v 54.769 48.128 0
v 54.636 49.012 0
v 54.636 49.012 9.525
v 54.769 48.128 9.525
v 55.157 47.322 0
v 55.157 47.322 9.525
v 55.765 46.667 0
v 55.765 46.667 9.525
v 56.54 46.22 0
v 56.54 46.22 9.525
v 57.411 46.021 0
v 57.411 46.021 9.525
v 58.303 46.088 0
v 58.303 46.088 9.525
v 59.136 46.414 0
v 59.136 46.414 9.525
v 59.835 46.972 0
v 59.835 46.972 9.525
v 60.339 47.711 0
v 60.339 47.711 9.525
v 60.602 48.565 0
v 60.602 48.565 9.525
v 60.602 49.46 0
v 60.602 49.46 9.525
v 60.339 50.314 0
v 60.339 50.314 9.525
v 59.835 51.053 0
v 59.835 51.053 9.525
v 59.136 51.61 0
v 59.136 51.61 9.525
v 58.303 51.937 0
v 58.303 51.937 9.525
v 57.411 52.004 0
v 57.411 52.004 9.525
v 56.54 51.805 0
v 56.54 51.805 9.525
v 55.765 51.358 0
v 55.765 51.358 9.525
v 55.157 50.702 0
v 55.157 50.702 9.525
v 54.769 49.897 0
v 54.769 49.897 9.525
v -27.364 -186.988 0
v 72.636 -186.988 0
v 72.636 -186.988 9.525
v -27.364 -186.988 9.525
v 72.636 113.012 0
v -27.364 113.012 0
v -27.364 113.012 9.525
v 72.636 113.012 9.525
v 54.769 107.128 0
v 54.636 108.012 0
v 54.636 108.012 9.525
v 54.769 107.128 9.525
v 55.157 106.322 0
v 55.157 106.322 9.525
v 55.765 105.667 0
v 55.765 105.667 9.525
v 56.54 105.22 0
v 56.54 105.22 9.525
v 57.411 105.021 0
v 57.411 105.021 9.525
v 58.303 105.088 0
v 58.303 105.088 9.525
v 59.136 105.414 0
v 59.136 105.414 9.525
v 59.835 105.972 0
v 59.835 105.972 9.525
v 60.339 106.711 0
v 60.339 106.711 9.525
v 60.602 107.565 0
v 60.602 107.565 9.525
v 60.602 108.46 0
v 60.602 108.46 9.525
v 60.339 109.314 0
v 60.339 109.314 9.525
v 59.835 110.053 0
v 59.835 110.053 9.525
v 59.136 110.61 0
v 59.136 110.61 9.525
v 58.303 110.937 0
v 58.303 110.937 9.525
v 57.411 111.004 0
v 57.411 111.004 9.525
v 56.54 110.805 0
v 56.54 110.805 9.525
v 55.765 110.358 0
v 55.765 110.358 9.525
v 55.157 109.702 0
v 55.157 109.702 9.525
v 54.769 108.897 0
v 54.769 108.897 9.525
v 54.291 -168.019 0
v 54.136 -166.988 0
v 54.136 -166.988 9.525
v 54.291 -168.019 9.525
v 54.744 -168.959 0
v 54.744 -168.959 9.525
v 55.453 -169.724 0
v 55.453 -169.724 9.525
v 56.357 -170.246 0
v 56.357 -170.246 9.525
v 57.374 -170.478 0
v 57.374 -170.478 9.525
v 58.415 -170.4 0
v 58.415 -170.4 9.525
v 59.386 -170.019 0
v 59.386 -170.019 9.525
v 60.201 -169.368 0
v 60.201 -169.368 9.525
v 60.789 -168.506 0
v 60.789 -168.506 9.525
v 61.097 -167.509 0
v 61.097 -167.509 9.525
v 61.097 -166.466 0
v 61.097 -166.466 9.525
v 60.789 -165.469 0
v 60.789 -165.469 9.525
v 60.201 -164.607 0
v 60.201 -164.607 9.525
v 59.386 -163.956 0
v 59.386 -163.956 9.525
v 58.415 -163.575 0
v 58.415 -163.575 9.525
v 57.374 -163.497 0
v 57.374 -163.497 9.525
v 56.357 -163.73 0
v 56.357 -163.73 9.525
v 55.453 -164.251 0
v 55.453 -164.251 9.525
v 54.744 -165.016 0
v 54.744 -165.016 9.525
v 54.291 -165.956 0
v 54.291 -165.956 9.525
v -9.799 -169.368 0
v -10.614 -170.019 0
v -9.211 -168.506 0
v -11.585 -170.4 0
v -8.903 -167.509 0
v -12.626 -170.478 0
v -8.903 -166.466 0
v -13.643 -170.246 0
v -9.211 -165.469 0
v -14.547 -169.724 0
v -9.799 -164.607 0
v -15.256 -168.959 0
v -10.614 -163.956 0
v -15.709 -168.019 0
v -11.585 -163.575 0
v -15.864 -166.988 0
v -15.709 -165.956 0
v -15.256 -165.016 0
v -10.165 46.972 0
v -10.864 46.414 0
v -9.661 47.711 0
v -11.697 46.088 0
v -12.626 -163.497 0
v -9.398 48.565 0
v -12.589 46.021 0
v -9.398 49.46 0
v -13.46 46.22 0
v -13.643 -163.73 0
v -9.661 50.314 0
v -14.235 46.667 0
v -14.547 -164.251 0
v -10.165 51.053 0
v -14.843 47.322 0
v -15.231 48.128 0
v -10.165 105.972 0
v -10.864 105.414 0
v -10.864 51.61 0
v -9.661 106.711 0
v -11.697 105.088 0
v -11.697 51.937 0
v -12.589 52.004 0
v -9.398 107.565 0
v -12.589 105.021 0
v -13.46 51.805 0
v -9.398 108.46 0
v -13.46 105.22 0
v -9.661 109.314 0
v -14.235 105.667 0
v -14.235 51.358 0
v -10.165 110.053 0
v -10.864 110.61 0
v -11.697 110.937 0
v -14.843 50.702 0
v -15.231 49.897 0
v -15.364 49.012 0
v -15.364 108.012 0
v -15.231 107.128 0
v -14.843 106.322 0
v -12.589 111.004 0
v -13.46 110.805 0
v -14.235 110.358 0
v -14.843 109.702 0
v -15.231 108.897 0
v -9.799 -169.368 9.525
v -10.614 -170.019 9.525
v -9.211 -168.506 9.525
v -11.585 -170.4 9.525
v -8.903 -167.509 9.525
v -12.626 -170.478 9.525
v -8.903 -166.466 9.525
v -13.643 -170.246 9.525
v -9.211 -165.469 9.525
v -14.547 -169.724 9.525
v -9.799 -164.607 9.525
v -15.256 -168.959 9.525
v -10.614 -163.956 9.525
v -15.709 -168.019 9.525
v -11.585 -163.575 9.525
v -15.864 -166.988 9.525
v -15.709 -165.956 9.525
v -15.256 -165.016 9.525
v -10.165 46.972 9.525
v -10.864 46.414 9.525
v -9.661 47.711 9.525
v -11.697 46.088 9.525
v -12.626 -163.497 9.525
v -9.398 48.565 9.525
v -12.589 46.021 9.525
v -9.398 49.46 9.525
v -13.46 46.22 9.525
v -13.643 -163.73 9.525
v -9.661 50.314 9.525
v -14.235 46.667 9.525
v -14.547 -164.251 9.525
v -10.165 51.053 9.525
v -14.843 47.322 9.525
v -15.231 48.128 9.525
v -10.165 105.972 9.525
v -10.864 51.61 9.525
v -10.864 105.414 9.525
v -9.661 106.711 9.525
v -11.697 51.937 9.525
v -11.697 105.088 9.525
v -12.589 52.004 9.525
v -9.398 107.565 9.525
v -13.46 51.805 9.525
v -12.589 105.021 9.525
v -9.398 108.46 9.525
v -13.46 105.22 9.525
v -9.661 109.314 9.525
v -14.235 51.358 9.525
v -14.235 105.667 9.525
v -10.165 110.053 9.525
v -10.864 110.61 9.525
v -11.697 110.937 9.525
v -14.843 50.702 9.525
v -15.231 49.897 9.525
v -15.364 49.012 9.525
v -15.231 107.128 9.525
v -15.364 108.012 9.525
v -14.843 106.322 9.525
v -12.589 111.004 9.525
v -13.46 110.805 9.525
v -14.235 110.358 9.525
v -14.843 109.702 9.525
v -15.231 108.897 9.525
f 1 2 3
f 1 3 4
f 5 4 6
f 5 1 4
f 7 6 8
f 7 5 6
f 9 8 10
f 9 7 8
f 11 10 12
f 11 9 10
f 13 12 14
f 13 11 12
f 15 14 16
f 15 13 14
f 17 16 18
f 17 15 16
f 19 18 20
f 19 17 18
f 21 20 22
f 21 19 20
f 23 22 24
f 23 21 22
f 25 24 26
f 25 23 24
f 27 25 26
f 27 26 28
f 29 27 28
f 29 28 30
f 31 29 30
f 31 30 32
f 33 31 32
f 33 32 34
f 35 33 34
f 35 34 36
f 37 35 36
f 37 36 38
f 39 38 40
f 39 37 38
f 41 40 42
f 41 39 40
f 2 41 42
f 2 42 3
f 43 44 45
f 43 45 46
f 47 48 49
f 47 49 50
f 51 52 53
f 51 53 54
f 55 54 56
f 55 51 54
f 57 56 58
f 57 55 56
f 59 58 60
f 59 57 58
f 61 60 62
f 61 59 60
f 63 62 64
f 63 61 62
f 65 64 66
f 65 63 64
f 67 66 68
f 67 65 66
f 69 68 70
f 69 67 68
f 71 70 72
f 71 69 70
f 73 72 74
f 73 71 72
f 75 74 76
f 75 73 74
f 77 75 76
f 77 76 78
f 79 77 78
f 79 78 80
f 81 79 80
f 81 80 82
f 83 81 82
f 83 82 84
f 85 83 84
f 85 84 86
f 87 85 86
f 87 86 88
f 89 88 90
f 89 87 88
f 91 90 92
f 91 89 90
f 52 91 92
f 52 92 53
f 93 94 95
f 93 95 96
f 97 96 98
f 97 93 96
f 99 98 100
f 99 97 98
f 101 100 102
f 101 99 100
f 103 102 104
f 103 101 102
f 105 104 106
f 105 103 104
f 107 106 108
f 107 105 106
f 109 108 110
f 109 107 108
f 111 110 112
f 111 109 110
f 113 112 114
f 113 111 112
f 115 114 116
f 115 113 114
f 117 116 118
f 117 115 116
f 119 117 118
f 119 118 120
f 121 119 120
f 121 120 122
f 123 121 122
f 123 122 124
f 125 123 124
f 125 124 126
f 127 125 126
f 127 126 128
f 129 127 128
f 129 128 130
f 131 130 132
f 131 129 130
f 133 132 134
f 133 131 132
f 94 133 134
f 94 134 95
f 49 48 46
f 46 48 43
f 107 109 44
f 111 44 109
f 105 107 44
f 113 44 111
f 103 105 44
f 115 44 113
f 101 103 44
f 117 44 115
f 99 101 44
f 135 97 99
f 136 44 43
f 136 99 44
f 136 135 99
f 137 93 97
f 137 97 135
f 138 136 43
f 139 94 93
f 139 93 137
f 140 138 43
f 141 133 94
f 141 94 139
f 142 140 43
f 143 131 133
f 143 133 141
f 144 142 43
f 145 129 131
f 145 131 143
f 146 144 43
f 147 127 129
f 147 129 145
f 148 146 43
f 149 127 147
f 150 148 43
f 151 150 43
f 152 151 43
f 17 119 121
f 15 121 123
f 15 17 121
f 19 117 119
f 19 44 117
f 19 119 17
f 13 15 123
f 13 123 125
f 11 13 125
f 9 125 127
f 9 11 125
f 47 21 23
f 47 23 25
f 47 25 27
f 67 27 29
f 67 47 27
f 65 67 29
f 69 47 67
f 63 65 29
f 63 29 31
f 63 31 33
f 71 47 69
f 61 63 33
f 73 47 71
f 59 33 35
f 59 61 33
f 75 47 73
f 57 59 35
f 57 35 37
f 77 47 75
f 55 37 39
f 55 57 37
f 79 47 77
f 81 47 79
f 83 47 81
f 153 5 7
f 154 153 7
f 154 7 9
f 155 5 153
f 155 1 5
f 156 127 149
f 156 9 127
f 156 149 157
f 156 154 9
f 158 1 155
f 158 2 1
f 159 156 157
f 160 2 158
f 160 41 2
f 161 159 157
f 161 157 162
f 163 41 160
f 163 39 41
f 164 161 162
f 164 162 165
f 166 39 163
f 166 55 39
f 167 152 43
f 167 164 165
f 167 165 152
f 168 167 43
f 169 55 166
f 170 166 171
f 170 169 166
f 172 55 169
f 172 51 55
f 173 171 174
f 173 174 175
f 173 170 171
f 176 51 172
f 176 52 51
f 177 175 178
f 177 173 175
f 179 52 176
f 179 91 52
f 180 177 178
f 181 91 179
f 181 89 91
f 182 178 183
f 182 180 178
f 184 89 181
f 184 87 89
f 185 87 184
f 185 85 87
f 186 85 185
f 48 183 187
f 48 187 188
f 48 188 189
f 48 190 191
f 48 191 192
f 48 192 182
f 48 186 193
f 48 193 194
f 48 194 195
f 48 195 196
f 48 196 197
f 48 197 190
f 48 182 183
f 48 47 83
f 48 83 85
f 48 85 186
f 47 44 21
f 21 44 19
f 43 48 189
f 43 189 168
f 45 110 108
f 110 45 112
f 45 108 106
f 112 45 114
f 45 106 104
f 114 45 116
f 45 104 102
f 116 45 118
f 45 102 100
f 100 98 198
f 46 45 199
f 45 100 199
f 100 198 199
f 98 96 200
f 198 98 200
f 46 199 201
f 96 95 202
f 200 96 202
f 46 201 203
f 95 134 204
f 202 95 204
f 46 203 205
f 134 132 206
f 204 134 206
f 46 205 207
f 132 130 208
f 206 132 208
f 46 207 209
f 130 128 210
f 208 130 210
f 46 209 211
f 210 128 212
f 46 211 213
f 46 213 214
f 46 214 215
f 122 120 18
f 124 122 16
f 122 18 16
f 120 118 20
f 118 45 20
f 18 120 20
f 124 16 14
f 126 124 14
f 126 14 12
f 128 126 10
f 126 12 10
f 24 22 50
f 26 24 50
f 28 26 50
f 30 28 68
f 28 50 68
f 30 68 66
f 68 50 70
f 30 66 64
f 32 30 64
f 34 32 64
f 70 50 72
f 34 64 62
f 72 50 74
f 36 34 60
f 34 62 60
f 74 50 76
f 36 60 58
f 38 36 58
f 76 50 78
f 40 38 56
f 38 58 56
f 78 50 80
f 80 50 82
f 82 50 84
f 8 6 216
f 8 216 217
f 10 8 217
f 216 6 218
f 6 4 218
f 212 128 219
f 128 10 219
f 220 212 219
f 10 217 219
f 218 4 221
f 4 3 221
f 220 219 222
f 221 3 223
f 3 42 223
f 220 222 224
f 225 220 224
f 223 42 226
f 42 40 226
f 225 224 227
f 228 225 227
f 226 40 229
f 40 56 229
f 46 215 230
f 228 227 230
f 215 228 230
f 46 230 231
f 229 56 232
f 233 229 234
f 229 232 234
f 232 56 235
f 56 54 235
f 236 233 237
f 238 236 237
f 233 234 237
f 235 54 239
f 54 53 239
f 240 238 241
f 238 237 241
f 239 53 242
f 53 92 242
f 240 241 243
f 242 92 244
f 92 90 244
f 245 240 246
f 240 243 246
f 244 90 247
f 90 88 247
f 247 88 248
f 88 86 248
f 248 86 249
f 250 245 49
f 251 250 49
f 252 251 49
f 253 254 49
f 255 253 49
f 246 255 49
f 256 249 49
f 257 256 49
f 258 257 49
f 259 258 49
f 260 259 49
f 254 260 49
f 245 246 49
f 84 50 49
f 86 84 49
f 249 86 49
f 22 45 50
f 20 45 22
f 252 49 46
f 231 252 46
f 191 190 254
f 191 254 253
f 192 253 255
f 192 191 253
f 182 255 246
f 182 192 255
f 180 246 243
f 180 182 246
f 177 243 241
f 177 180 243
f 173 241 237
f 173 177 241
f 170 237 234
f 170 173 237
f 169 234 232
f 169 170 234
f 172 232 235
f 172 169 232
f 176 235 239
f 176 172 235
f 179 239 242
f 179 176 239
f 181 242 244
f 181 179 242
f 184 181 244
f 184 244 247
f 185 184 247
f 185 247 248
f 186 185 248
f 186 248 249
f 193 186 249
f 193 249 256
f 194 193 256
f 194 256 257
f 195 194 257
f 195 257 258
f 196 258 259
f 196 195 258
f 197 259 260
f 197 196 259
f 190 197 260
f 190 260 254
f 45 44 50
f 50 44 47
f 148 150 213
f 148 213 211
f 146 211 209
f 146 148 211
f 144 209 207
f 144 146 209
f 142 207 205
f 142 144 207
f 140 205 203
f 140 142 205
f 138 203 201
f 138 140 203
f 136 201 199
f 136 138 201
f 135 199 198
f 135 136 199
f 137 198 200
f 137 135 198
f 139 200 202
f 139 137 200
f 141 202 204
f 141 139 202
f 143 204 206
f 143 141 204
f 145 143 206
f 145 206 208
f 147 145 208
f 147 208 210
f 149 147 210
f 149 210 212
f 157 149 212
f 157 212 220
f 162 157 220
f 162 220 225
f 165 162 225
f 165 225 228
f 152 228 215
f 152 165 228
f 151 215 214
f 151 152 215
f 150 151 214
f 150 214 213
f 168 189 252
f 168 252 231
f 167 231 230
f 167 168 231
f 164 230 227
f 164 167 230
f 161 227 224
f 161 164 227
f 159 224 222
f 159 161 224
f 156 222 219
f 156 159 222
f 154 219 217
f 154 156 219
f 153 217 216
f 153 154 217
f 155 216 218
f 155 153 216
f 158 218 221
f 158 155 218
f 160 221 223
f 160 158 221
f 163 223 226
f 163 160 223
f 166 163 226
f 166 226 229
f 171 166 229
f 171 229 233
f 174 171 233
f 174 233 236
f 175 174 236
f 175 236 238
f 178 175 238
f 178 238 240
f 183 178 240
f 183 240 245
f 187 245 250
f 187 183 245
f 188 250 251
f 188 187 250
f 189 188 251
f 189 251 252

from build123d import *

# Parameters (mm, degrees)
SKETCH1_R           = 3
SKETCH1_R_2         = 3.5
BOSS_EXTRUDE1_DEPTH = 9.525


with BuildPart() as part:
    # Sketch1 → Boss-Extrude1 (new body)
    with BuildSketch(Plane.XY):
        Polygon((-27.364320758, 113.012415756), (72.635679242, 113.012415756), (72.635679242, 7.787512308), (72.635679242, -131.987584244), (72.635679242, -186.987584244), (-27.364320758, -186.987584244), (-27.364320758, -131.987584244), (-27.364320758, 7.787512308), align=None)
        with Locations(Location((-12.364320758, 108.012415756, 0), (0, 0, 180))):
            Circle(SKETCH1_R, mode=Mode.SUBTRACT)
        with Locations(Location((57.635679242, 49.012415756, 0), (0, 0, 180))):
            Circle(SKETCH1_R, mode=Mode.SUBTRACT)
        with Locations(Location((-12.364320758, 49.012415756, 0), (0, 0, 180))):
            Circle(SKETCH1_R, mode=Mode.SUBTRACT)
        with Locations(Location((57.635679242, 108.012415756, 0), (0, 0, 180))):
            Circle(SKETCH1_R, mode=Mode.SUBTRACT)
        with Locations(Location((-12.364320758, -166.987584244, 0), (0, 0, 180))):
            Circle(SKETCH1_R_2, mode=Mode.SUBTRACT)
        with Locations(Location((57.635679242, -166.987584244, 0), (0, 0, 180))):
            Circle(SKETCH1_R_2, mode=Mode.SUBTRACT)
    extrude(amount=BOSS_EXTRUDE1_DEPTH)


solid = part.part
